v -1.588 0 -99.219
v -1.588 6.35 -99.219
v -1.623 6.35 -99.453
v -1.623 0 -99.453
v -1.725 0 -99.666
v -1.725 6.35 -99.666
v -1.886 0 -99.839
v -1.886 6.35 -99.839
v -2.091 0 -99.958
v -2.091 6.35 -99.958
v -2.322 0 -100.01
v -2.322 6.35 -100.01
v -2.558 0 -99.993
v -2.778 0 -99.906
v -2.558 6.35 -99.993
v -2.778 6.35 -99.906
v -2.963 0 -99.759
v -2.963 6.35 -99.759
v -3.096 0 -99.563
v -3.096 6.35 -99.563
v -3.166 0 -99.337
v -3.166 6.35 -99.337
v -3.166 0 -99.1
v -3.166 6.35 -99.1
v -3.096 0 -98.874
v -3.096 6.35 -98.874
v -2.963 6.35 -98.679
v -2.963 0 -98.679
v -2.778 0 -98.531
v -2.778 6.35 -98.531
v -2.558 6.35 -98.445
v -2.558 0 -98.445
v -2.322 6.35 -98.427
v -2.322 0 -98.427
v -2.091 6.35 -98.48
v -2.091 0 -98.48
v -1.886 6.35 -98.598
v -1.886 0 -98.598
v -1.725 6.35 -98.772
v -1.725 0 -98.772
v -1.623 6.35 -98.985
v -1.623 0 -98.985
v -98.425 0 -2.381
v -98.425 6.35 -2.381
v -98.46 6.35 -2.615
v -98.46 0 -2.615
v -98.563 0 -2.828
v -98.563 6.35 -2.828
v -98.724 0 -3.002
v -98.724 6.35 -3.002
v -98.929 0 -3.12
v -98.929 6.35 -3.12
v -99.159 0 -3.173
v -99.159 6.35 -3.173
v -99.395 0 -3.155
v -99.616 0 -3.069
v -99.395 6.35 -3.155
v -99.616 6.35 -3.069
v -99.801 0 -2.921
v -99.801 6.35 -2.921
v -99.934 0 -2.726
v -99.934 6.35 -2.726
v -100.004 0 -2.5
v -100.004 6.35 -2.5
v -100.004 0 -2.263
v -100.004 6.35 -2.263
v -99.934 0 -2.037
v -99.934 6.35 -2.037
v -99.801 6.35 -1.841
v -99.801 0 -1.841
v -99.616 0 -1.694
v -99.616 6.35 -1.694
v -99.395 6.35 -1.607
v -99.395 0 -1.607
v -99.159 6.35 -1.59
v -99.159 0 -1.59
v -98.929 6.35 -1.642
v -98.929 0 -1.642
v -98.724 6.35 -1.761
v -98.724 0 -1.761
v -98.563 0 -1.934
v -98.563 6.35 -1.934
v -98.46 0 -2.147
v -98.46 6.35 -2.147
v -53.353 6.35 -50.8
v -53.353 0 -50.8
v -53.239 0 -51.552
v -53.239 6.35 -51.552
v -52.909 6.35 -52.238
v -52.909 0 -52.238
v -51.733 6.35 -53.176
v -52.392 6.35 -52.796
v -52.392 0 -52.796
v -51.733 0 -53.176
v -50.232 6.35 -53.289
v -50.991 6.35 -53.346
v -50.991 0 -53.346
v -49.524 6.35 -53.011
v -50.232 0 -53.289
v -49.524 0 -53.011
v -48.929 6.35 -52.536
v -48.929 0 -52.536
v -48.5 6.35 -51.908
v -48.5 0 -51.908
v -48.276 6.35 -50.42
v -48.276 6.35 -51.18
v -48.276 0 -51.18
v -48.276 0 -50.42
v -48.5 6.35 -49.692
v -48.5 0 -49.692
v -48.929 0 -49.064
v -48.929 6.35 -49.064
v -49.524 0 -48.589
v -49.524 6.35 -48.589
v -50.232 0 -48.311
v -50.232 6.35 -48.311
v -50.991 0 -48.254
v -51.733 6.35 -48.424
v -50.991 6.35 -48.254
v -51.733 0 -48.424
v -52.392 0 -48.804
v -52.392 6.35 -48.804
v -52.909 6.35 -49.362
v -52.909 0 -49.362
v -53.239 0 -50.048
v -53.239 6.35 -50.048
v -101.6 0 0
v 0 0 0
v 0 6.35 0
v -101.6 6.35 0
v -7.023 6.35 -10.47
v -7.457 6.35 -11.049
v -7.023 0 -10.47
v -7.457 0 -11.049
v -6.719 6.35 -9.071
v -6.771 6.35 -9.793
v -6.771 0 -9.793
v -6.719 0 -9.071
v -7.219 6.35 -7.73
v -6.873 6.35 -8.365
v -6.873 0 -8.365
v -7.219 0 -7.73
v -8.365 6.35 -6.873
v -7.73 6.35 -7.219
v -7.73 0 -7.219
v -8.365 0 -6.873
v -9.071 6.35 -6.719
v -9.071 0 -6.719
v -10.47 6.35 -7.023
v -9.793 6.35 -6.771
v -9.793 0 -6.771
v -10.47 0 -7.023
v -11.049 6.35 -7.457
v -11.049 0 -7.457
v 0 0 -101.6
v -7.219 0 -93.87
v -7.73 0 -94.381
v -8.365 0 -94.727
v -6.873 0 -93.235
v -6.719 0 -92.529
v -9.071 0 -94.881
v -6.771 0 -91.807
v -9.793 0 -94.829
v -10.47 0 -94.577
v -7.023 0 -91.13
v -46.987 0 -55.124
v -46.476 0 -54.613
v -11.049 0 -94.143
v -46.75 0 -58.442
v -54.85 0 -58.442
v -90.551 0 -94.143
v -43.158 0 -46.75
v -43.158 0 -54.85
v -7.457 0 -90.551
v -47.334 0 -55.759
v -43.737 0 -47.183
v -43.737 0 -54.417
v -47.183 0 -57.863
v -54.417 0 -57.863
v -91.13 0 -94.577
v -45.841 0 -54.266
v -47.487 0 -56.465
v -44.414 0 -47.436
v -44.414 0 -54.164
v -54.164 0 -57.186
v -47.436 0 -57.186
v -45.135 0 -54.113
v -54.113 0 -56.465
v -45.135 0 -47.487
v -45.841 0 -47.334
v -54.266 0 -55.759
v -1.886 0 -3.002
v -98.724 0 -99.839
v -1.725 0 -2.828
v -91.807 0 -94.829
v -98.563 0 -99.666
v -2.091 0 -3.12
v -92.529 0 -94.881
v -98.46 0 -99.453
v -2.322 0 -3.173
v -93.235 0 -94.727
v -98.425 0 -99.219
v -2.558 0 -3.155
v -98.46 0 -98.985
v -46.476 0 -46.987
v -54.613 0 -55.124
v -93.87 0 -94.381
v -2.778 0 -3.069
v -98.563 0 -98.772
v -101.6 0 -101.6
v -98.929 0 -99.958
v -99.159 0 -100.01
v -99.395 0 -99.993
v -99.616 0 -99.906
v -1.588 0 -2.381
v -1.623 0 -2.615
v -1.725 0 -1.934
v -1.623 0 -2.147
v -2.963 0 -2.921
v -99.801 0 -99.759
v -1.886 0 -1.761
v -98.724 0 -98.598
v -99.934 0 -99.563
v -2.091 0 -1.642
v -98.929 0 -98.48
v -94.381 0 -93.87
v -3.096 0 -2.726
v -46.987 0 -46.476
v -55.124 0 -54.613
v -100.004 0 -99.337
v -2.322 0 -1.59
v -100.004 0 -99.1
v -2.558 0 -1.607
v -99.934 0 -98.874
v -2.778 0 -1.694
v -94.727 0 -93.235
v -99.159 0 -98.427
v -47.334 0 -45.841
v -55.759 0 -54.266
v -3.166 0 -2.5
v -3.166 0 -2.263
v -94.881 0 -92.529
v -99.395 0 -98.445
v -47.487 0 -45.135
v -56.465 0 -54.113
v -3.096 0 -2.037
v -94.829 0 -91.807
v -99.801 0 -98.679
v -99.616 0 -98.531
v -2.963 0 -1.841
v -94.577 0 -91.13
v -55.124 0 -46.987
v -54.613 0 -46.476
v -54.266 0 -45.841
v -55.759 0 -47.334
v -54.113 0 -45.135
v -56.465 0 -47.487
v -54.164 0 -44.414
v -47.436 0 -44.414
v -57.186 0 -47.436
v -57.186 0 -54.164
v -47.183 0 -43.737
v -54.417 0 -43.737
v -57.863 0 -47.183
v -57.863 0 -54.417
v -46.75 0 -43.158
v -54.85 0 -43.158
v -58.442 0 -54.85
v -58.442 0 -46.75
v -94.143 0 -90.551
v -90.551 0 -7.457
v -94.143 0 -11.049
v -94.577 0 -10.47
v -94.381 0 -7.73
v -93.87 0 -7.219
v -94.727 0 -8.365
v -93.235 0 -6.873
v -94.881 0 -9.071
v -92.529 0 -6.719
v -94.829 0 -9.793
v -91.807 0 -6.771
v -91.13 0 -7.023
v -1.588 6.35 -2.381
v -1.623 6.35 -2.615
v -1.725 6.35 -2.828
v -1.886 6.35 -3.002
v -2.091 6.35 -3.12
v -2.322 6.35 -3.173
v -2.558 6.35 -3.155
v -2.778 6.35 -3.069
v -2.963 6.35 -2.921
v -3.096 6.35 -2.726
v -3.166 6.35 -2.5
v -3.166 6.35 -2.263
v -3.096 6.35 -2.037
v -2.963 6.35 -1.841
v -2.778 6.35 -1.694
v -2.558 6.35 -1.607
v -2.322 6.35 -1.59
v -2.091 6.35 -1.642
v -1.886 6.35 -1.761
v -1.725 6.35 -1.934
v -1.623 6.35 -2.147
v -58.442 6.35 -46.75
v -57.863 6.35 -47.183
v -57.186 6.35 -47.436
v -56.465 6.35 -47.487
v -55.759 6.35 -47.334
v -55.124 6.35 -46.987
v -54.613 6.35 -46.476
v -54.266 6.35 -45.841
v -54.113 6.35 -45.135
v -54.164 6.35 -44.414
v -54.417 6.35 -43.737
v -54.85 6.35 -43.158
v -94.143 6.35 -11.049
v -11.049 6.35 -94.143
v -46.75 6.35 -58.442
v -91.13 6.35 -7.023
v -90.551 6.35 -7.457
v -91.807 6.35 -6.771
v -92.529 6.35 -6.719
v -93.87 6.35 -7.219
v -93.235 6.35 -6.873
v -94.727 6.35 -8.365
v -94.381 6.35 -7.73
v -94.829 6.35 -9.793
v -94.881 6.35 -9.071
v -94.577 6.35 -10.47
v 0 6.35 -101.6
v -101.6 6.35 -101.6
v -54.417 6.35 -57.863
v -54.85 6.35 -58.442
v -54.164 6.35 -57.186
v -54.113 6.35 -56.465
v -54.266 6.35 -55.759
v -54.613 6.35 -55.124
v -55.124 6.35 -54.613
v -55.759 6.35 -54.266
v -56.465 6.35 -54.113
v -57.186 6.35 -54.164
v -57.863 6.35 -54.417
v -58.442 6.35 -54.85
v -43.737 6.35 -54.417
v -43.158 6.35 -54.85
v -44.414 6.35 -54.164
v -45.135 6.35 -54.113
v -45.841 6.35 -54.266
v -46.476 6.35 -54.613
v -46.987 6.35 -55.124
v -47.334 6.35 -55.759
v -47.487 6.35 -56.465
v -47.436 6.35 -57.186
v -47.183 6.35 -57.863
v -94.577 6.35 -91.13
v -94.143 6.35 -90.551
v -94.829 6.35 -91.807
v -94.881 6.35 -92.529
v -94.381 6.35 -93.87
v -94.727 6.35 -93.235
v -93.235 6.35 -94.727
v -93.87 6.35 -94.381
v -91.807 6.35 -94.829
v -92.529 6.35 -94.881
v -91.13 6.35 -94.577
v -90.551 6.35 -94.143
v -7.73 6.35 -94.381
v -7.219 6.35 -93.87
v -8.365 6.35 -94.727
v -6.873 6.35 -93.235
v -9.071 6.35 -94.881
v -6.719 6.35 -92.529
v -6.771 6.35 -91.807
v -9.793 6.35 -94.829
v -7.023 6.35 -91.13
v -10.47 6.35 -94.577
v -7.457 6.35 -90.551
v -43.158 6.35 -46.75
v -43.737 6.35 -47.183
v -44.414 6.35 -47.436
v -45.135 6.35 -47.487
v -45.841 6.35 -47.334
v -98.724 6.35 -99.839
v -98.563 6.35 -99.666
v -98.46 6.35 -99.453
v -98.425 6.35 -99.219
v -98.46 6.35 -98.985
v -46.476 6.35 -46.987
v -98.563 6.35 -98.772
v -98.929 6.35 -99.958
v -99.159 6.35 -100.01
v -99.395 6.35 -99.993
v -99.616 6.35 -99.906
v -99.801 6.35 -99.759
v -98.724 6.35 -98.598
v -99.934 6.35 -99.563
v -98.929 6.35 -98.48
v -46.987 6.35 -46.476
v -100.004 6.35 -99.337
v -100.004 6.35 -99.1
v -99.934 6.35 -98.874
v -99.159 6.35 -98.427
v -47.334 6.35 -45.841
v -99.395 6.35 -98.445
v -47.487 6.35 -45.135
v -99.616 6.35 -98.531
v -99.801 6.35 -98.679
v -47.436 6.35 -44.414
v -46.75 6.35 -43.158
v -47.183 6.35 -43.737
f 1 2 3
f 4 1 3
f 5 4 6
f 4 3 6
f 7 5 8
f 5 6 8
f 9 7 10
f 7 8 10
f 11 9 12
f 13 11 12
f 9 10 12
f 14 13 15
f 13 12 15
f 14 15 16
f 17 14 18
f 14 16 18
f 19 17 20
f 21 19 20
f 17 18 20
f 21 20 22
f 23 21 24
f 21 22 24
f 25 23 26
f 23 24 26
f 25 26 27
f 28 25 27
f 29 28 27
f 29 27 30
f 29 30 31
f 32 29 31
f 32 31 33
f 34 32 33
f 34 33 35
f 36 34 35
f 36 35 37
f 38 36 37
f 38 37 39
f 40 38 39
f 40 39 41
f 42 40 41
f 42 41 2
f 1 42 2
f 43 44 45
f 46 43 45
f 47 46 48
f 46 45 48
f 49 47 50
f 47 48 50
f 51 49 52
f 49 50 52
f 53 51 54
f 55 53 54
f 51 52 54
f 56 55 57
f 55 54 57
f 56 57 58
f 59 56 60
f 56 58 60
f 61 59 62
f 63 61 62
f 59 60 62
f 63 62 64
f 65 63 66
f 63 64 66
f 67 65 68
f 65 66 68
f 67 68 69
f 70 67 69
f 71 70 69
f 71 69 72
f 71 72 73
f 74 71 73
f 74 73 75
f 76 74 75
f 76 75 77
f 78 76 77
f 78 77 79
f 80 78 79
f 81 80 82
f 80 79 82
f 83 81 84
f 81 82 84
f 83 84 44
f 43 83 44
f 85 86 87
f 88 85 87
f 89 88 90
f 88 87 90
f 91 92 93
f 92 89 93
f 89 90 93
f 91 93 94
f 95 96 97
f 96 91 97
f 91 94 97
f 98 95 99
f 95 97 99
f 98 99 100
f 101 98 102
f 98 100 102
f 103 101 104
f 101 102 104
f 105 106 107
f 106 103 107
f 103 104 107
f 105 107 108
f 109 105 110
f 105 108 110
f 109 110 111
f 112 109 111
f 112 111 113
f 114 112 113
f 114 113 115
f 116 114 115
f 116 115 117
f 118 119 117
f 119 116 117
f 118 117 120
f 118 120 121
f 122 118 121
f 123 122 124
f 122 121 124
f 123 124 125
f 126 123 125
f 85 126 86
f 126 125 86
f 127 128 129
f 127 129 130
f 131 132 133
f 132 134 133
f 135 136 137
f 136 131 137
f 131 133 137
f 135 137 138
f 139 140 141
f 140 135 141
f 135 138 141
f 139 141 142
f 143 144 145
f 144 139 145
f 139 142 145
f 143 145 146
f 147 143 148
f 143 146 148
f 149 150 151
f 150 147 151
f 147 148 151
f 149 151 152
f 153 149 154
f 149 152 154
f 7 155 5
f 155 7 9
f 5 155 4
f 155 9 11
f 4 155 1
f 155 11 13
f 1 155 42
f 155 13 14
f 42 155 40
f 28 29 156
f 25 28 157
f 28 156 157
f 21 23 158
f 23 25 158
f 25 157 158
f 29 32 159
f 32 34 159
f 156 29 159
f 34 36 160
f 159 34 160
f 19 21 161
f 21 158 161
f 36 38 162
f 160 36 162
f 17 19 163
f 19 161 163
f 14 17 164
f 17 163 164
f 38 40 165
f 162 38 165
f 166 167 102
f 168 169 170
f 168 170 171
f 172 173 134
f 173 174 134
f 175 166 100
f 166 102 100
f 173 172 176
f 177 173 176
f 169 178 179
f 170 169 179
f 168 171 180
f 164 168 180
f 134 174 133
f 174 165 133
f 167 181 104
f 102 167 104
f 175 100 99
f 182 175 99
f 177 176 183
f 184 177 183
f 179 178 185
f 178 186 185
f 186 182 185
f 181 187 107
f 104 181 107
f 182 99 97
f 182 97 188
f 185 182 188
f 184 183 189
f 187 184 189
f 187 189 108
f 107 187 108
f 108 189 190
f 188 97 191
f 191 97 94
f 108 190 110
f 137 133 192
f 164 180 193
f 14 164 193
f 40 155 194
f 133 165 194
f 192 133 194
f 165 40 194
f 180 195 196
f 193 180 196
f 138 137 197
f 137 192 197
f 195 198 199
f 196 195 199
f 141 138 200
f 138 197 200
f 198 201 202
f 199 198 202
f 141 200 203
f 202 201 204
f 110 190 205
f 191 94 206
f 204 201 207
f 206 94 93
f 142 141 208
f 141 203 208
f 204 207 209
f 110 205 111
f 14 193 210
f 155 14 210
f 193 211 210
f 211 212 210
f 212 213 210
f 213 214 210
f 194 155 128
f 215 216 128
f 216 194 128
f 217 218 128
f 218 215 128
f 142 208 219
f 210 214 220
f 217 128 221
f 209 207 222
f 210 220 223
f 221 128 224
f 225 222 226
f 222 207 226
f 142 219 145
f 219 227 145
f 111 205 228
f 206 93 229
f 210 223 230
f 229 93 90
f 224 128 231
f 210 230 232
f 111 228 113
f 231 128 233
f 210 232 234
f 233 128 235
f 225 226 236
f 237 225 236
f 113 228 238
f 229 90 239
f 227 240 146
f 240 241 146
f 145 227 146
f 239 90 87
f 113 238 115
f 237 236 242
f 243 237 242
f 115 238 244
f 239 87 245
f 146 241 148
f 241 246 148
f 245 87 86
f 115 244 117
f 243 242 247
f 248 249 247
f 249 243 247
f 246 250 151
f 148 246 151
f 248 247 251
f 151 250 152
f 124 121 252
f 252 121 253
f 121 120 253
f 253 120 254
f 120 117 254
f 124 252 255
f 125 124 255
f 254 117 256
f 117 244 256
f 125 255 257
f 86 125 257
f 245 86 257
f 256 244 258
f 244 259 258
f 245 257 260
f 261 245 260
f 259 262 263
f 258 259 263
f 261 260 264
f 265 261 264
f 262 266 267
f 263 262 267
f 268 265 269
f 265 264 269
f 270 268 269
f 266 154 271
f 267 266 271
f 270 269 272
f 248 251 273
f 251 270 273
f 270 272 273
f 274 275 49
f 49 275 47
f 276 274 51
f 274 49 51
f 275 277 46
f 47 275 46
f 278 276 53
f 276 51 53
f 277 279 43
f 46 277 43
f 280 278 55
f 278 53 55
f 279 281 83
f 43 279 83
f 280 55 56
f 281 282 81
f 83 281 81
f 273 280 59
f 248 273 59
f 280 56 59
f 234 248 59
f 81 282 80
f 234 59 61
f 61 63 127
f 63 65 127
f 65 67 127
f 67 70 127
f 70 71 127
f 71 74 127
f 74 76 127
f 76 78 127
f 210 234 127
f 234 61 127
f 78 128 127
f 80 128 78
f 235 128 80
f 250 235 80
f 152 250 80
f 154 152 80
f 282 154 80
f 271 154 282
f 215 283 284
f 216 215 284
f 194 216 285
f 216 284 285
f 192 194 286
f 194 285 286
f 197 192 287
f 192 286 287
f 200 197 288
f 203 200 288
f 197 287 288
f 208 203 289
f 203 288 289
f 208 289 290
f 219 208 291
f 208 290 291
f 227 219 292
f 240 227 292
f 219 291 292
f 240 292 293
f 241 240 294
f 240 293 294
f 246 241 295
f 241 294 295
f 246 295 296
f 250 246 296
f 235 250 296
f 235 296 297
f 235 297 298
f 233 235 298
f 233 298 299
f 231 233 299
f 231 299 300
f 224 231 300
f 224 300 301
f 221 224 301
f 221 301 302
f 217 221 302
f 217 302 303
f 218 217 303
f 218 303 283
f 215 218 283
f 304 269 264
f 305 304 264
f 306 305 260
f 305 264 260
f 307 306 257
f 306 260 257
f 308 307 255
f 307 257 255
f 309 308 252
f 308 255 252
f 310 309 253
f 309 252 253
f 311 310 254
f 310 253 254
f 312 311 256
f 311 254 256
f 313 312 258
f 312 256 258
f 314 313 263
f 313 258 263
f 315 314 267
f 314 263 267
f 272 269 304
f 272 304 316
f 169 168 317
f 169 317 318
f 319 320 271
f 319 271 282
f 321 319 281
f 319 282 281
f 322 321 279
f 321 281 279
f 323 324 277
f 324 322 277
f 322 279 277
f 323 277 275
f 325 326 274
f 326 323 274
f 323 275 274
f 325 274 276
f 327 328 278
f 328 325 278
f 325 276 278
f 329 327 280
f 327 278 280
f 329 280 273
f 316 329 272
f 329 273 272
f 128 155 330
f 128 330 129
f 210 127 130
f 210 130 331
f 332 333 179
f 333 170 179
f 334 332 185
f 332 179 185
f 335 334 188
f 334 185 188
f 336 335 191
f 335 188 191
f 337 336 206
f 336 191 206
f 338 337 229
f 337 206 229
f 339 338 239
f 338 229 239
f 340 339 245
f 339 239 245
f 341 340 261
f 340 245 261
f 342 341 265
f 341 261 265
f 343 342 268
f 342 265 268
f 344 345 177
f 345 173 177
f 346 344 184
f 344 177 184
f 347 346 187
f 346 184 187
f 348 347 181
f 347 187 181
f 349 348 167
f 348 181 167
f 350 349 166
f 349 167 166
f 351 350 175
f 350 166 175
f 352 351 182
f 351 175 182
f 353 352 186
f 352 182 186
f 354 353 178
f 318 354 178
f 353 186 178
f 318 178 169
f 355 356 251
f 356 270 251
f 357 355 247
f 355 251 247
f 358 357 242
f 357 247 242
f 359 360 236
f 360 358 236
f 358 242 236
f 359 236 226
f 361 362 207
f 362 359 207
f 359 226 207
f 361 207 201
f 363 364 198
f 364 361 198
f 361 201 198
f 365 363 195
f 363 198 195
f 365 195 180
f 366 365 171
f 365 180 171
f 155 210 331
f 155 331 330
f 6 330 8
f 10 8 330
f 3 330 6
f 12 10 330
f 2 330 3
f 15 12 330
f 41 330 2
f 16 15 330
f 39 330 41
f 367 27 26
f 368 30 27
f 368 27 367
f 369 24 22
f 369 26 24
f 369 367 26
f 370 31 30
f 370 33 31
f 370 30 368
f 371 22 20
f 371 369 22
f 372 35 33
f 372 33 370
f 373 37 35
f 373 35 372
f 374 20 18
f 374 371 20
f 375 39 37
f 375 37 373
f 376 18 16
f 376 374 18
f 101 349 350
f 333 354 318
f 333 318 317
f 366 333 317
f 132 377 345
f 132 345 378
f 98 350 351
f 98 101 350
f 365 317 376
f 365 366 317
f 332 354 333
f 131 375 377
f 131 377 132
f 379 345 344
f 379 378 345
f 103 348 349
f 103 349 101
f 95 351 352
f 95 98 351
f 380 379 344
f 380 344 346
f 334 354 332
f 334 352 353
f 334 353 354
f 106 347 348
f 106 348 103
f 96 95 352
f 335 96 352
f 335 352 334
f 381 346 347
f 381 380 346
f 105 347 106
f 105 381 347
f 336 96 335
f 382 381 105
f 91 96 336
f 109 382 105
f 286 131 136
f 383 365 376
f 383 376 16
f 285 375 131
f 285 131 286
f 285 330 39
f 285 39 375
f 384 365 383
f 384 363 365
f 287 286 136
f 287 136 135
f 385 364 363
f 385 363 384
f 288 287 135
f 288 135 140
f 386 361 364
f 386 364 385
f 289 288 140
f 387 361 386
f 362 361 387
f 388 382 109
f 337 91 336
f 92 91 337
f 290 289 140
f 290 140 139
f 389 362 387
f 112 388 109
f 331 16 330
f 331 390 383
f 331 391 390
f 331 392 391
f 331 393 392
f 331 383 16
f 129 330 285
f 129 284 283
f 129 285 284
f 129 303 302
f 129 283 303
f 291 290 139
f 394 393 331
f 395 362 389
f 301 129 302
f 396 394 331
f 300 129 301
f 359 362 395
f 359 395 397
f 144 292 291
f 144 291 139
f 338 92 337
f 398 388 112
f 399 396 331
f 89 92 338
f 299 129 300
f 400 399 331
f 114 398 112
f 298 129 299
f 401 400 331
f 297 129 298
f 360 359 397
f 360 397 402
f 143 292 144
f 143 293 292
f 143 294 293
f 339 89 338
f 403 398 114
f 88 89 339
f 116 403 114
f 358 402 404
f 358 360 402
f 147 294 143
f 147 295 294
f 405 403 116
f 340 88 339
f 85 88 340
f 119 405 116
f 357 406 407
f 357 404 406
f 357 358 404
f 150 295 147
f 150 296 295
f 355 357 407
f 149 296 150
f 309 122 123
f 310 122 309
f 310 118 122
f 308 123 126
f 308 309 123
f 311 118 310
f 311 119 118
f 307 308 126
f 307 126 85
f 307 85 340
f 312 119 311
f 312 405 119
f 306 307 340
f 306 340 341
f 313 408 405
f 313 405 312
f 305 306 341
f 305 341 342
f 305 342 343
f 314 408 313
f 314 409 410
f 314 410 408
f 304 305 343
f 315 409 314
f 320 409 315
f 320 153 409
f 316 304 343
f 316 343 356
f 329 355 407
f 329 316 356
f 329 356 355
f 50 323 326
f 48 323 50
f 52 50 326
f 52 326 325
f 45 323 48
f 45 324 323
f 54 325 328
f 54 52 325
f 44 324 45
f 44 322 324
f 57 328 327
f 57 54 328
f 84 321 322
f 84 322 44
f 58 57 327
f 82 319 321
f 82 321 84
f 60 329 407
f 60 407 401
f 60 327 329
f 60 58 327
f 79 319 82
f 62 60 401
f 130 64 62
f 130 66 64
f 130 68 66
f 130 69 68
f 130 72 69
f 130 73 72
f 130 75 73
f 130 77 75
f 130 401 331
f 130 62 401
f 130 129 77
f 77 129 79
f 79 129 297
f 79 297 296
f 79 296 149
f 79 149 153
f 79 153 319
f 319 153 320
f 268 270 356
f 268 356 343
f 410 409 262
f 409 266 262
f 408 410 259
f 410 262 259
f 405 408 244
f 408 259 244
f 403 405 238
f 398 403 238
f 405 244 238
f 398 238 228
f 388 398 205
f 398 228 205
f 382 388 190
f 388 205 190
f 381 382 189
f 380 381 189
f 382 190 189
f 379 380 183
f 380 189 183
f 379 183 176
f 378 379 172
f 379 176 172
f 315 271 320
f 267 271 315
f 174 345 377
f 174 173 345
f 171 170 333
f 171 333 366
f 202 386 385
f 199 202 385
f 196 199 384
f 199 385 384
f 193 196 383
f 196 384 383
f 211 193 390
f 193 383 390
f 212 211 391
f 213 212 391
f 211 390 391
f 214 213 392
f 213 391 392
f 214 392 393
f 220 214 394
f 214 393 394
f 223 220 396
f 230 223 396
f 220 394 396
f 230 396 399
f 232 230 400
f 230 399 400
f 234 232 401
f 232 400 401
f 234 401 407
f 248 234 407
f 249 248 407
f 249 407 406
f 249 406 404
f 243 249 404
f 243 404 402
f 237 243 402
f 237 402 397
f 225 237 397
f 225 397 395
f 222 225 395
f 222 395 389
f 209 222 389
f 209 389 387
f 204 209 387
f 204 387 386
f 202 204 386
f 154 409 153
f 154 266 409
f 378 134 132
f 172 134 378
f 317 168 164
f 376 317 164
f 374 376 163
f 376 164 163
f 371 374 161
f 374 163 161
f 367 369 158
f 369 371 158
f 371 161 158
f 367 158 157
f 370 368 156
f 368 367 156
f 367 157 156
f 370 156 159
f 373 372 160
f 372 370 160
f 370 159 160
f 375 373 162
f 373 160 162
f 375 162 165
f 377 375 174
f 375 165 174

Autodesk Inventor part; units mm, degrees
ref_plane "YZ Plane" through (0, 0, 0) normal (1, 0, 0) x (0, 1, 0)
ref_plane "XZ Plane" through (0, 0, 0) normal (0, 1, 0) x (-1, 0, 0)
ref_plane "XY Plane" through (0, 0, 0) normal (0, 0, 1) x (1, 0, 0)
sketch "Sketch1" plane through (0, 0, 0) normal (0, 1, 0) x (-1, 0, 0)
  line L0 (0, 0) -> (101.6, 0)
  line L1 (101.6, 0) -> (101.6, -101.6)
  line L2 (101.6, -101.6) -> (0, -101.6)
  line L3 (0, -101.6) -> (0, 0)
  line L4 (4.7625, -96.8375) -> (96.8375, -96.8375)
  line L5 (96.8375, -96.8375) -> (96.8375, -4.7625)
  line L6 (96.8375, -4.7625) -> (4.7625, -4.7625)
  line L7 (4.7625, -4.7625) -> (4.7625, -96.8375)
  line L8 (96.8375, -4.7625) -> (4.7625, -96.8375) construction
  circle A0 centre (50.8, -50.8) radius 2.5527
  circle A1 centre (50.8, -50.8) radius 5.7277
  line L9 (54.850096, -46.749904) -> (94.143423, -7.456577) construction
  line L10 (58.442198, -46.749904) -> (94.143423, -11.048679)
  line L11 (90.551321, -7.456577) -> (54.850096, -43.157802)
  arc A2 (54.850096, -43.157802) -> (58.442198, -46.749904) centre (56.646147, -44.953853) ccw
  arc A3 (94.143423, -11.048679) -> (90.551321, -7.456577) centre (92.347372, -9.252628) ccw
  line L12 (46.749904, -43.157802) -> (11.048679, -7.456577)
  arc A4 (43.157802, -46.749904) -> (46.749904, -43.157802) centre (44.953853, -44.953853) ccw
  line L13 (7.456577, -11.048679) -> (43.157802, -46.749904)
  arc A5 (11.048679, -7.456577) -> (7.456577, -11.048679) centre (9.252628, -9.252628) ccw
  line L14 (43.157802, -54.850096) -> (7.456577, -90.551321)
  arc A6 (46.749904, -58.442198) -> (43.157802, -54.850096) centre (44.953853, -56.646147) ccw
  line L15 (11.048679, -94.143423) -> (46.749904, -58.442198)
  arc A7 (7.456577, -90.551321) -> (11.048679, -94.143423) centre (9.252628, -92.347372) ccw
  line L16 (54.850096, -58.442198) -> (90.551321, -94.143423)
  arc A8 (58.442198, -54.850096) -> (54.850096, -58.442198) centre (56.646147, -56.646147) ccw
  line L17 (94.143423, -90.551321) -> (58.442198, -54.850096)
  arc A9 (90.551321, -94.143423) -> (94.143423, -90.551321) centre (92.347372, -92.347372) ccw
  point P0 (0, -50.8)
  point P1 (74.496759, -27.103241)
  dimension "d0" = 101.6
  dimension "d1" = 101.6
  dimension "d2" = 4.7625
  dimension "d33" = 5.1054
  dimension "d34" = 3.175
  dimension "d35" = 5.08
  dimension "d36" = 6.35
  dimension "d39" = 360
extrude "Extrusion1" add sketch "Sketch1" along normal blind 6.35 contours L0 L1 L2 L3 | L7 L6 L5 L4 | A1
sketch "Sketch2" plane through (0, 6.35, 0) normal (0, 1, 0) x (1, 0, 0)
  line L0 (0, 101.6) -> (-101.6, 101.6)
  line L1 (-101.6, 101.6) -> (-101.6, 0)
  line L2 (-101.6, 0) -> (0, 0)
  line L3 (0, 0) -> (0, 101.6)
  circle A0 centre (-99.21875, 99.21875) radius 0.79375
  circle A1 centre (-99.21875, 2.38125) radius 0.79375
  circle A2 centre (-2.38125, 99.21875) radius 0.79375
  circle A3 centre (-2.38125, 2.38125) radius 0.79375
  dimension "d20" = 1.5875
  dimension "d21" = 2.38125
  dimension "d22" = 2.38125
  dimension "d25" = 96.8375
  dimension "d28" = 96.8375
extrude "Extrusion2" cut sketch "Sketch2" against normal blind 6.35 contours A0 | A1 | A2 | A3
sketch "Sketch3" plane through (0, 6.35, 0) normal (0, 1, 0) x (1, 0, 0)
  circle A0 centre (-99.21875, 99.21875) radius 0.79375
  circle A1 centre (-99.21875, 2.38125) radius 0.79375
  circle A2 centre (-2.38125, 99.21875) radius 0.79375
  circle A3 centre (-2.38125, 2.38125) radius 0.79375
  line L0 (0, 101.6) -> (-101.6, 101.6)
  line L1 (-101.6, 101.6) -> (-101.6, 0)
  line L2 (-101.6, 0) -> (0, 0)
  line L3 (0, 0) -> (0, 101.6)
  arc A4 (-58.442198, 54.850096) -> (-54.850096, 58.442198) centre (-56.646147, 56.646147) ccw
  line L4 (-58.442198, 54.850096) -> (-94.143423, 90.551321)
  arc A5 (-90.551321, 94.143423) -> (-94.143423, 90.551321) centre (-92.347372, 92.347372) ccw
  line L5 (-90.551321, 94.143423) -> (-54.850096, 58.442198)
  circle A6 centre (-50.8, 50.8) radius 2.5527
  arc A7 (-46.749904, 58.442198) -> (-43.157802, 54.850096) centre (-44.953853, 56.646147) ccw
  line L6 (-46.749904, 58.442198) -> (-11.048679, 94.143423)
  arc A8 (-7.456577, 90.551321) -> (-11.048679, 94.143423) centre (-9.252628, 92.347372) ccw
  line L7 (-7.456577, 90.551321) -> (-43.157802, 54.850096)
  arc A9 (-43.157802, 46.749904) -> (-46.749904, 43.157802) centre (-44.953853, 44.953853) ccw
  line L8 (-43.157802, 46.749904) -> (-7.456577, 11.048679)
  arc A10 (-11.048679, 7.456577) -> (-7.456577, 11.048679) centre (-9.252628, 9.252628) ccw
  line L9 (-11.048679, 7.456577) -> (-46.749904, 43.157802)
  arc A11 (-54.850096, 43.157802) -> (-58.442198, 46.749904) centre (-56.646147, 44.953853) ccw
  line L10 (-54.850096, 43.157802) -> (-90.551321, 7.456577)
  arc A12 (-94.143423, 11.048679) -> (-90.551321, 7.456577) centre (-92.347372, 9.252628) ccw
  line L11 (-94.143423, 11.048679) -> (-58.442198, 46.749904)
sketch "Sketch4" plane through (0, 6.35, 0) normal (0, 1, 0) x (1, 0, 0)
  circle A0 centre (-99.21875, 99.21875) radius 0.79375
  circle A1 centre (-99.21875, 2.38125) radius 0.79375
  circle A2 centre (-2.38125, 99.21875) radius 0.79375
  circle A3 centre (-2.38125, 2.38125) radius 0.79375
  line L0 (0, 101.6) -> (-101.6, 101.6)
  line L1 (-101.6, 101.6) -> (-101.6, 0)
  line L2 (-101.6, 0) -> (0, 0)
  line L3 (0, 0) -> (0, 101.6)
  arc A4 (-58.442198, 54.850096) -> (-54.850096, 58.442198) centre (-56.646147, 56.646147) ccw
  line L4 (-58.442198, 54.850096) -> (-94.143423, 90.551321)
  arc A5 (-90.551321, 94.143423) -> (-94.143423, 90.551321) centre (-92.347372, 92.347372) ccw
  line L5 (-90.551321, 94.143423) -> (-54.850096, 58.442198)
  circle A6 centre (-50.8, 50.8) radius 2.5527
  arc A7 (-46.749904, 58.442198) -> (-43.157802, 54.850096) centre (-44.953853, 56.646147) ccw
  line L6 (-46.749904, 58.442198) -> (-11.048679, 94.143423)
  arc A8 (-7.456577, 90.551321) -> (-11.048679, 94.143423) centre (-9.252628, 92.347372) ccw
  line L7 (-7.456577, 90.551321) -> (-43.157802, 54.850096)
  arc A9 (-43.157802, 46.749904) -> (-46.749904, 43.157802) centre (-44.953853, 44.953853) ccw
  line L8 (-43.157802, 46.749904) -> (-7.456577, 11.048679)
  arc A10 (-11.048679, 7.456577) -> (-7.456577, 11.048679) centre (-9.252628, 9.252628) ccw
  line L9 (-11.048679, 7.456577) -> (-46.749904, 43.157802)
  arc A11 (-54.850096, 43.157802) -> (-58.442198, 46.749904) centre (-56.646147, 44.953853) ccw
  line L10 (-54.850096, 43.157802) -> (-90.551321, 7.456577)
  arc A12 (-94.143423, 11.048679) -> (-90.551321, 7.456577) centre (-92.347372, 9.252628) ccw
  line L11 (-94.143423, 11.048679) -> (-58.442198, 46.749904)
  circle A13 centre (-36.53596, 36.53596) radius 2.159
  line L12 (-44.953853, 44.953853) -> (-9.252628, 9.252628) construction
  circle A14 centre (-50.8, 50.8) radius 25.4
  line L13 (-45.068826, 32.632552) -> (-56.531174, 68.967448) construction
  circle A15 centre (-45.068826, 32.632552) radius 2.159 construction
  circle A16 centre (-56.531174, 68.967448) radius 2.159 construction
  line L14 (-56.531174, 68.967448) -> (-36.53596, 36.53596) construction
  dimension "d41" = 4.318
  dimension "d42" = 50.8
  dimension "d43" = 4.318
  dimension "d44" = 4.318
  dimension "d45" = 38.1
  dimension "d46" = 38.1
ref_plane "Work Plane1" through (-56.646147, 0, -44.953853) normal (0.7071068, 0, 0.7071068) x (0.7071068, 0, -0.7071068)
properties part number "Layer 5"
